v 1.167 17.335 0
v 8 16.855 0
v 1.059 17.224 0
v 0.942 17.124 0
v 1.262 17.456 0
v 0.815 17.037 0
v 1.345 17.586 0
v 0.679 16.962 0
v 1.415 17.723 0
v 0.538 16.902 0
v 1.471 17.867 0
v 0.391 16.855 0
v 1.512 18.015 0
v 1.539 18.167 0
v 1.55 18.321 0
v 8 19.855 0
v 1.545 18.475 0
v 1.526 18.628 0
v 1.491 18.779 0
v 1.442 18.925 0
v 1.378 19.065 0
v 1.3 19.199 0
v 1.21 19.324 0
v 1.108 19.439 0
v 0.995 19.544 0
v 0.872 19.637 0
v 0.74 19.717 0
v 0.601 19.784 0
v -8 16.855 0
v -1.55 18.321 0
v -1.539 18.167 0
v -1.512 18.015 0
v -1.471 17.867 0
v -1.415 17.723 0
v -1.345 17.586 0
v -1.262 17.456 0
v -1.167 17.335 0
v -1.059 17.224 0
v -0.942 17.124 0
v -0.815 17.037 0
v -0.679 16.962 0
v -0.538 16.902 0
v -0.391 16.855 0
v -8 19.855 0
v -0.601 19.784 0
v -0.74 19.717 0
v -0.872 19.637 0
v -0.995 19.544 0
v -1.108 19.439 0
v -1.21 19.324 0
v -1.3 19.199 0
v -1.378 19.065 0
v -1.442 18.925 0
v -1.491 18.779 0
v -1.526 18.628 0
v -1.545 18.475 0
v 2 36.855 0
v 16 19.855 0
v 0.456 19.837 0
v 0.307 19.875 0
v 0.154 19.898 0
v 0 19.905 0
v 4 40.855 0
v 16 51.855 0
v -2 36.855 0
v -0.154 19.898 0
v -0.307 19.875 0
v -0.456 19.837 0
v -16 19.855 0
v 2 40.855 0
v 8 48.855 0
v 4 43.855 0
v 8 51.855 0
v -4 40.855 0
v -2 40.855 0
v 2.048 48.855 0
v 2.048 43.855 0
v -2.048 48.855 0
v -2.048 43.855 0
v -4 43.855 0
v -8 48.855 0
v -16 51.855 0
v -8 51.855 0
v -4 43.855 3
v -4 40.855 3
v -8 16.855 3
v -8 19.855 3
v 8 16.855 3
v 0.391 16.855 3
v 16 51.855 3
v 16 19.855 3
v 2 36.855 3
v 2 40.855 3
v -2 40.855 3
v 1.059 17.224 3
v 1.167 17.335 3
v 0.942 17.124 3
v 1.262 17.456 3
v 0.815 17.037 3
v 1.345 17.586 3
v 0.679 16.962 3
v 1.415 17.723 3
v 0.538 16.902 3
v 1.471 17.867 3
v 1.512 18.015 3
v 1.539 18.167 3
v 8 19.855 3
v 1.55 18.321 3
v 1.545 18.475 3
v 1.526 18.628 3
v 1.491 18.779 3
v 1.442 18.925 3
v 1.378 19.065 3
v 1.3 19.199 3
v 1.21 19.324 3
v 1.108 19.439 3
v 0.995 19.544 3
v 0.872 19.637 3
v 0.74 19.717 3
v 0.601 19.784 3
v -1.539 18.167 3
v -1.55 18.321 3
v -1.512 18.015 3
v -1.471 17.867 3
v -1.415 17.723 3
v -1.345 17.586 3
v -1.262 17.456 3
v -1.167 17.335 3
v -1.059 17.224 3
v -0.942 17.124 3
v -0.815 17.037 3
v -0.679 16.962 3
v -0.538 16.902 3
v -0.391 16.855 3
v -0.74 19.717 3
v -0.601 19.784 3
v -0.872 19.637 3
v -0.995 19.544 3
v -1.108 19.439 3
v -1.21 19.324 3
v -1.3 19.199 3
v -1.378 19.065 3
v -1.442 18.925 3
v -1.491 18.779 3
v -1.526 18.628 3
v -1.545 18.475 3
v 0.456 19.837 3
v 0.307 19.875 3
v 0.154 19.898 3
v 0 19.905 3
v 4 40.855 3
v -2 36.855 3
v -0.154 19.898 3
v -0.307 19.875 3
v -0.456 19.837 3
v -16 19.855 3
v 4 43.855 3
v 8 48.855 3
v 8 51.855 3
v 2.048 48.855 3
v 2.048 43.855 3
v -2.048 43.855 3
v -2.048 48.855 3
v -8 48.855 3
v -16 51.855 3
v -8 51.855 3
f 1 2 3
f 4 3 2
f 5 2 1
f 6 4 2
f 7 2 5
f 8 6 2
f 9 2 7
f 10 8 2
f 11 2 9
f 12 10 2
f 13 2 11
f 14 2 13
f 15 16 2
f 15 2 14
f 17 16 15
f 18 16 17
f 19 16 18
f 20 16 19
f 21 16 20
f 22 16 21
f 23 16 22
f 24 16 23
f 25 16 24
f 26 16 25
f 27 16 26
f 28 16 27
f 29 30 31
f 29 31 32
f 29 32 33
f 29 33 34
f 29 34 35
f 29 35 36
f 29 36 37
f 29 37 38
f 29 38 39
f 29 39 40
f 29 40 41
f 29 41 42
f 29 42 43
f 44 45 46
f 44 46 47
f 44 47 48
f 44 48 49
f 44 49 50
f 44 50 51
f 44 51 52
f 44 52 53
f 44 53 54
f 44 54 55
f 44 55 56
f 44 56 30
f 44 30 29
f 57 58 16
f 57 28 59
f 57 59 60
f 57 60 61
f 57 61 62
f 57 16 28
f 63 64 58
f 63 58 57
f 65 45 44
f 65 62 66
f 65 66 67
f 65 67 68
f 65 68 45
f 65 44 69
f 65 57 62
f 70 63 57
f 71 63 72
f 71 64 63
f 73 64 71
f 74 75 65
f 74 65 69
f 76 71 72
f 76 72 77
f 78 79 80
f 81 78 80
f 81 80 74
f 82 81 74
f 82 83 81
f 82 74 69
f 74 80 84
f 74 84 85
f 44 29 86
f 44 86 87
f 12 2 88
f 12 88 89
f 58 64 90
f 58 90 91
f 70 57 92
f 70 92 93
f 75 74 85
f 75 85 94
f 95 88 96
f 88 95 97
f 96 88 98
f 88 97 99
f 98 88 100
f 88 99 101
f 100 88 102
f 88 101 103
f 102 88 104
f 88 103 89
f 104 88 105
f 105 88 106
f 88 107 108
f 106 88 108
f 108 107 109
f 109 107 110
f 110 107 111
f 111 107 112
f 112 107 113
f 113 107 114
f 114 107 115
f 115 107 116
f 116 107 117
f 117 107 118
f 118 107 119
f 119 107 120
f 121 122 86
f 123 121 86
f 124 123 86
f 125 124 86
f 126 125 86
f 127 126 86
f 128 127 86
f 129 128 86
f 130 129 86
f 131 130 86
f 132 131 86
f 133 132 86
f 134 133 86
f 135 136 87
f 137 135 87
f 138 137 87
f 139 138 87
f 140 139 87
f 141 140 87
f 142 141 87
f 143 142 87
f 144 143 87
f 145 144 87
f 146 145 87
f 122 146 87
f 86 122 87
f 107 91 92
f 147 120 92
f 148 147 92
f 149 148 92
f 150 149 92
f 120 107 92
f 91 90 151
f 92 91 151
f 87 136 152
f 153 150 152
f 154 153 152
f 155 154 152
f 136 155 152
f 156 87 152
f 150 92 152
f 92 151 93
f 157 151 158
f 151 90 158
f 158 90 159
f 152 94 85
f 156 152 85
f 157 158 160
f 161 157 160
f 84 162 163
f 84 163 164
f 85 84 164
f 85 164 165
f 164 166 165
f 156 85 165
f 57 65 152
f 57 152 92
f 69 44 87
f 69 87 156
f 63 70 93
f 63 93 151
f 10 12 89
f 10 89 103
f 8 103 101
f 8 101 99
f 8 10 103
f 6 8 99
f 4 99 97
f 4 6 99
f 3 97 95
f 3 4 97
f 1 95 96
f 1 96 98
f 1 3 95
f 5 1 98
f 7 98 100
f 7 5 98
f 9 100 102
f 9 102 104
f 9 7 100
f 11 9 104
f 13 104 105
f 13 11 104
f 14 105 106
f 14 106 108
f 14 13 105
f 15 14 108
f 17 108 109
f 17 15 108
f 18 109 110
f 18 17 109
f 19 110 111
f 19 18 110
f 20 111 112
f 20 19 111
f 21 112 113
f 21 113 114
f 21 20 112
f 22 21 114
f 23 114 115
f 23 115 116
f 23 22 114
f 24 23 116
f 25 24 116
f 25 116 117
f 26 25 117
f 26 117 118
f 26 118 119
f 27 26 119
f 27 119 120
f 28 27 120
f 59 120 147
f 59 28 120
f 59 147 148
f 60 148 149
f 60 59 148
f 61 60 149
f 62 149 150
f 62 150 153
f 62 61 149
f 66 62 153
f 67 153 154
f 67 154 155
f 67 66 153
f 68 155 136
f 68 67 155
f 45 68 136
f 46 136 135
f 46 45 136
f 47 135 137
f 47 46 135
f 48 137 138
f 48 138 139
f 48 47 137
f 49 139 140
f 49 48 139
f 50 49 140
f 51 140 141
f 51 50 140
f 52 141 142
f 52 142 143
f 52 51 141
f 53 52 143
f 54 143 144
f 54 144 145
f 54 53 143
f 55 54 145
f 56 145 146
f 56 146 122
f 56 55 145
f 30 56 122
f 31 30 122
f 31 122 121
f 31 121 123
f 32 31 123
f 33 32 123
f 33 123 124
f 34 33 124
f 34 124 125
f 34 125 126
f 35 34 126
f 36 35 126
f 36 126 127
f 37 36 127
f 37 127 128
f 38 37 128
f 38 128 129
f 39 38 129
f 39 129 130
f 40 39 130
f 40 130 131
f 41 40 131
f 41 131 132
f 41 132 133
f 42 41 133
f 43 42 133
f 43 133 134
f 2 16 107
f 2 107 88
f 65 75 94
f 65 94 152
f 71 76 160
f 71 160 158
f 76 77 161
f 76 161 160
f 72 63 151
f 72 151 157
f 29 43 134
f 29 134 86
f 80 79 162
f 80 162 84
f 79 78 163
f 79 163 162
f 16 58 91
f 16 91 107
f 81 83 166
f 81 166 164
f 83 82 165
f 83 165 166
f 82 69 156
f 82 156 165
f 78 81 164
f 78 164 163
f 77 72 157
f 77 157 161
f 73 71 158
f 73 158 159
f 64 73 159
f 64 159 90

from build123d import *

# Parameters (mm, degrees)
EXTRUDE_1_DEPTH = 3


with BuildPart() as part:
    # 草图2 → 凸台-拉伸1 (new body)
    with BuildSketch(Plane.XY):
        with BuildLine():
            Line((2.047890023, 48.855305477), (8, 48.855305477))
            Line((8, 48.855305477), (8, 51.855305477))
            Line((8, 51.855305477), (16, 51.855305477))
            Line((16, 51.855305477), (16, 19.855305477))
            Line((16, 19.855305477), (8, 19.855305477))
            Line((8, 19.855305477), (8, 16.855305477))
            Line((8, 16.855305477), (0.390512484, 16.855305477))
            ThreePointArc((0.390512484, 16.855305477), (0, 19.905305477), (-0.390512484, 16.855305477))
            Line((-0.390512484, 16.855305477), (-8, 16.855305477))
            Line((-8, 16.855305477), (-8, 19.855305477))
            Line((-8, 19.855305477), (-16, 19.855305477))
            Line((-16, 19.855305477), (-16, 51.855305477))
            Line((-16, 51.855305477), (-8, 51.855305477))
            Line((-8, 51.855305477), (-8, 48.855305477))
            Line((-8, 48.855305477), (-2.047890023, 48.855305477))
            Line((-2.047890023, 48.855305477), (-2.047890023, 43.855305477))
            Line((-2.047890023, 43.855305477), (-4, 43.855305477))
            Line((-4, 43.855305477), (-4, 40.855305477))
            Line((-4, 40.855305477), (-2, 40.855305477))
            Line((-2, 40.855305477), (-2, 36.855305477))
            Line((-2, 36.855305477), (2, 36.855305477))
            Line((2, 36.855305477), (2, 40.855305477))
            Line((2, 40.855305477), (4, 40.855305477))
            Line((4, 40.855305477), (4, 43.855305477))
            Line((4, 43.855305477), (2.047890023, 43.855305477))
            Line((2.047890023, 43.855305477), (2.047890023, 48.855305477))
        make_face()
    extrude(amount=EXTRUDE_1_DEPTH)


solid = part.part
